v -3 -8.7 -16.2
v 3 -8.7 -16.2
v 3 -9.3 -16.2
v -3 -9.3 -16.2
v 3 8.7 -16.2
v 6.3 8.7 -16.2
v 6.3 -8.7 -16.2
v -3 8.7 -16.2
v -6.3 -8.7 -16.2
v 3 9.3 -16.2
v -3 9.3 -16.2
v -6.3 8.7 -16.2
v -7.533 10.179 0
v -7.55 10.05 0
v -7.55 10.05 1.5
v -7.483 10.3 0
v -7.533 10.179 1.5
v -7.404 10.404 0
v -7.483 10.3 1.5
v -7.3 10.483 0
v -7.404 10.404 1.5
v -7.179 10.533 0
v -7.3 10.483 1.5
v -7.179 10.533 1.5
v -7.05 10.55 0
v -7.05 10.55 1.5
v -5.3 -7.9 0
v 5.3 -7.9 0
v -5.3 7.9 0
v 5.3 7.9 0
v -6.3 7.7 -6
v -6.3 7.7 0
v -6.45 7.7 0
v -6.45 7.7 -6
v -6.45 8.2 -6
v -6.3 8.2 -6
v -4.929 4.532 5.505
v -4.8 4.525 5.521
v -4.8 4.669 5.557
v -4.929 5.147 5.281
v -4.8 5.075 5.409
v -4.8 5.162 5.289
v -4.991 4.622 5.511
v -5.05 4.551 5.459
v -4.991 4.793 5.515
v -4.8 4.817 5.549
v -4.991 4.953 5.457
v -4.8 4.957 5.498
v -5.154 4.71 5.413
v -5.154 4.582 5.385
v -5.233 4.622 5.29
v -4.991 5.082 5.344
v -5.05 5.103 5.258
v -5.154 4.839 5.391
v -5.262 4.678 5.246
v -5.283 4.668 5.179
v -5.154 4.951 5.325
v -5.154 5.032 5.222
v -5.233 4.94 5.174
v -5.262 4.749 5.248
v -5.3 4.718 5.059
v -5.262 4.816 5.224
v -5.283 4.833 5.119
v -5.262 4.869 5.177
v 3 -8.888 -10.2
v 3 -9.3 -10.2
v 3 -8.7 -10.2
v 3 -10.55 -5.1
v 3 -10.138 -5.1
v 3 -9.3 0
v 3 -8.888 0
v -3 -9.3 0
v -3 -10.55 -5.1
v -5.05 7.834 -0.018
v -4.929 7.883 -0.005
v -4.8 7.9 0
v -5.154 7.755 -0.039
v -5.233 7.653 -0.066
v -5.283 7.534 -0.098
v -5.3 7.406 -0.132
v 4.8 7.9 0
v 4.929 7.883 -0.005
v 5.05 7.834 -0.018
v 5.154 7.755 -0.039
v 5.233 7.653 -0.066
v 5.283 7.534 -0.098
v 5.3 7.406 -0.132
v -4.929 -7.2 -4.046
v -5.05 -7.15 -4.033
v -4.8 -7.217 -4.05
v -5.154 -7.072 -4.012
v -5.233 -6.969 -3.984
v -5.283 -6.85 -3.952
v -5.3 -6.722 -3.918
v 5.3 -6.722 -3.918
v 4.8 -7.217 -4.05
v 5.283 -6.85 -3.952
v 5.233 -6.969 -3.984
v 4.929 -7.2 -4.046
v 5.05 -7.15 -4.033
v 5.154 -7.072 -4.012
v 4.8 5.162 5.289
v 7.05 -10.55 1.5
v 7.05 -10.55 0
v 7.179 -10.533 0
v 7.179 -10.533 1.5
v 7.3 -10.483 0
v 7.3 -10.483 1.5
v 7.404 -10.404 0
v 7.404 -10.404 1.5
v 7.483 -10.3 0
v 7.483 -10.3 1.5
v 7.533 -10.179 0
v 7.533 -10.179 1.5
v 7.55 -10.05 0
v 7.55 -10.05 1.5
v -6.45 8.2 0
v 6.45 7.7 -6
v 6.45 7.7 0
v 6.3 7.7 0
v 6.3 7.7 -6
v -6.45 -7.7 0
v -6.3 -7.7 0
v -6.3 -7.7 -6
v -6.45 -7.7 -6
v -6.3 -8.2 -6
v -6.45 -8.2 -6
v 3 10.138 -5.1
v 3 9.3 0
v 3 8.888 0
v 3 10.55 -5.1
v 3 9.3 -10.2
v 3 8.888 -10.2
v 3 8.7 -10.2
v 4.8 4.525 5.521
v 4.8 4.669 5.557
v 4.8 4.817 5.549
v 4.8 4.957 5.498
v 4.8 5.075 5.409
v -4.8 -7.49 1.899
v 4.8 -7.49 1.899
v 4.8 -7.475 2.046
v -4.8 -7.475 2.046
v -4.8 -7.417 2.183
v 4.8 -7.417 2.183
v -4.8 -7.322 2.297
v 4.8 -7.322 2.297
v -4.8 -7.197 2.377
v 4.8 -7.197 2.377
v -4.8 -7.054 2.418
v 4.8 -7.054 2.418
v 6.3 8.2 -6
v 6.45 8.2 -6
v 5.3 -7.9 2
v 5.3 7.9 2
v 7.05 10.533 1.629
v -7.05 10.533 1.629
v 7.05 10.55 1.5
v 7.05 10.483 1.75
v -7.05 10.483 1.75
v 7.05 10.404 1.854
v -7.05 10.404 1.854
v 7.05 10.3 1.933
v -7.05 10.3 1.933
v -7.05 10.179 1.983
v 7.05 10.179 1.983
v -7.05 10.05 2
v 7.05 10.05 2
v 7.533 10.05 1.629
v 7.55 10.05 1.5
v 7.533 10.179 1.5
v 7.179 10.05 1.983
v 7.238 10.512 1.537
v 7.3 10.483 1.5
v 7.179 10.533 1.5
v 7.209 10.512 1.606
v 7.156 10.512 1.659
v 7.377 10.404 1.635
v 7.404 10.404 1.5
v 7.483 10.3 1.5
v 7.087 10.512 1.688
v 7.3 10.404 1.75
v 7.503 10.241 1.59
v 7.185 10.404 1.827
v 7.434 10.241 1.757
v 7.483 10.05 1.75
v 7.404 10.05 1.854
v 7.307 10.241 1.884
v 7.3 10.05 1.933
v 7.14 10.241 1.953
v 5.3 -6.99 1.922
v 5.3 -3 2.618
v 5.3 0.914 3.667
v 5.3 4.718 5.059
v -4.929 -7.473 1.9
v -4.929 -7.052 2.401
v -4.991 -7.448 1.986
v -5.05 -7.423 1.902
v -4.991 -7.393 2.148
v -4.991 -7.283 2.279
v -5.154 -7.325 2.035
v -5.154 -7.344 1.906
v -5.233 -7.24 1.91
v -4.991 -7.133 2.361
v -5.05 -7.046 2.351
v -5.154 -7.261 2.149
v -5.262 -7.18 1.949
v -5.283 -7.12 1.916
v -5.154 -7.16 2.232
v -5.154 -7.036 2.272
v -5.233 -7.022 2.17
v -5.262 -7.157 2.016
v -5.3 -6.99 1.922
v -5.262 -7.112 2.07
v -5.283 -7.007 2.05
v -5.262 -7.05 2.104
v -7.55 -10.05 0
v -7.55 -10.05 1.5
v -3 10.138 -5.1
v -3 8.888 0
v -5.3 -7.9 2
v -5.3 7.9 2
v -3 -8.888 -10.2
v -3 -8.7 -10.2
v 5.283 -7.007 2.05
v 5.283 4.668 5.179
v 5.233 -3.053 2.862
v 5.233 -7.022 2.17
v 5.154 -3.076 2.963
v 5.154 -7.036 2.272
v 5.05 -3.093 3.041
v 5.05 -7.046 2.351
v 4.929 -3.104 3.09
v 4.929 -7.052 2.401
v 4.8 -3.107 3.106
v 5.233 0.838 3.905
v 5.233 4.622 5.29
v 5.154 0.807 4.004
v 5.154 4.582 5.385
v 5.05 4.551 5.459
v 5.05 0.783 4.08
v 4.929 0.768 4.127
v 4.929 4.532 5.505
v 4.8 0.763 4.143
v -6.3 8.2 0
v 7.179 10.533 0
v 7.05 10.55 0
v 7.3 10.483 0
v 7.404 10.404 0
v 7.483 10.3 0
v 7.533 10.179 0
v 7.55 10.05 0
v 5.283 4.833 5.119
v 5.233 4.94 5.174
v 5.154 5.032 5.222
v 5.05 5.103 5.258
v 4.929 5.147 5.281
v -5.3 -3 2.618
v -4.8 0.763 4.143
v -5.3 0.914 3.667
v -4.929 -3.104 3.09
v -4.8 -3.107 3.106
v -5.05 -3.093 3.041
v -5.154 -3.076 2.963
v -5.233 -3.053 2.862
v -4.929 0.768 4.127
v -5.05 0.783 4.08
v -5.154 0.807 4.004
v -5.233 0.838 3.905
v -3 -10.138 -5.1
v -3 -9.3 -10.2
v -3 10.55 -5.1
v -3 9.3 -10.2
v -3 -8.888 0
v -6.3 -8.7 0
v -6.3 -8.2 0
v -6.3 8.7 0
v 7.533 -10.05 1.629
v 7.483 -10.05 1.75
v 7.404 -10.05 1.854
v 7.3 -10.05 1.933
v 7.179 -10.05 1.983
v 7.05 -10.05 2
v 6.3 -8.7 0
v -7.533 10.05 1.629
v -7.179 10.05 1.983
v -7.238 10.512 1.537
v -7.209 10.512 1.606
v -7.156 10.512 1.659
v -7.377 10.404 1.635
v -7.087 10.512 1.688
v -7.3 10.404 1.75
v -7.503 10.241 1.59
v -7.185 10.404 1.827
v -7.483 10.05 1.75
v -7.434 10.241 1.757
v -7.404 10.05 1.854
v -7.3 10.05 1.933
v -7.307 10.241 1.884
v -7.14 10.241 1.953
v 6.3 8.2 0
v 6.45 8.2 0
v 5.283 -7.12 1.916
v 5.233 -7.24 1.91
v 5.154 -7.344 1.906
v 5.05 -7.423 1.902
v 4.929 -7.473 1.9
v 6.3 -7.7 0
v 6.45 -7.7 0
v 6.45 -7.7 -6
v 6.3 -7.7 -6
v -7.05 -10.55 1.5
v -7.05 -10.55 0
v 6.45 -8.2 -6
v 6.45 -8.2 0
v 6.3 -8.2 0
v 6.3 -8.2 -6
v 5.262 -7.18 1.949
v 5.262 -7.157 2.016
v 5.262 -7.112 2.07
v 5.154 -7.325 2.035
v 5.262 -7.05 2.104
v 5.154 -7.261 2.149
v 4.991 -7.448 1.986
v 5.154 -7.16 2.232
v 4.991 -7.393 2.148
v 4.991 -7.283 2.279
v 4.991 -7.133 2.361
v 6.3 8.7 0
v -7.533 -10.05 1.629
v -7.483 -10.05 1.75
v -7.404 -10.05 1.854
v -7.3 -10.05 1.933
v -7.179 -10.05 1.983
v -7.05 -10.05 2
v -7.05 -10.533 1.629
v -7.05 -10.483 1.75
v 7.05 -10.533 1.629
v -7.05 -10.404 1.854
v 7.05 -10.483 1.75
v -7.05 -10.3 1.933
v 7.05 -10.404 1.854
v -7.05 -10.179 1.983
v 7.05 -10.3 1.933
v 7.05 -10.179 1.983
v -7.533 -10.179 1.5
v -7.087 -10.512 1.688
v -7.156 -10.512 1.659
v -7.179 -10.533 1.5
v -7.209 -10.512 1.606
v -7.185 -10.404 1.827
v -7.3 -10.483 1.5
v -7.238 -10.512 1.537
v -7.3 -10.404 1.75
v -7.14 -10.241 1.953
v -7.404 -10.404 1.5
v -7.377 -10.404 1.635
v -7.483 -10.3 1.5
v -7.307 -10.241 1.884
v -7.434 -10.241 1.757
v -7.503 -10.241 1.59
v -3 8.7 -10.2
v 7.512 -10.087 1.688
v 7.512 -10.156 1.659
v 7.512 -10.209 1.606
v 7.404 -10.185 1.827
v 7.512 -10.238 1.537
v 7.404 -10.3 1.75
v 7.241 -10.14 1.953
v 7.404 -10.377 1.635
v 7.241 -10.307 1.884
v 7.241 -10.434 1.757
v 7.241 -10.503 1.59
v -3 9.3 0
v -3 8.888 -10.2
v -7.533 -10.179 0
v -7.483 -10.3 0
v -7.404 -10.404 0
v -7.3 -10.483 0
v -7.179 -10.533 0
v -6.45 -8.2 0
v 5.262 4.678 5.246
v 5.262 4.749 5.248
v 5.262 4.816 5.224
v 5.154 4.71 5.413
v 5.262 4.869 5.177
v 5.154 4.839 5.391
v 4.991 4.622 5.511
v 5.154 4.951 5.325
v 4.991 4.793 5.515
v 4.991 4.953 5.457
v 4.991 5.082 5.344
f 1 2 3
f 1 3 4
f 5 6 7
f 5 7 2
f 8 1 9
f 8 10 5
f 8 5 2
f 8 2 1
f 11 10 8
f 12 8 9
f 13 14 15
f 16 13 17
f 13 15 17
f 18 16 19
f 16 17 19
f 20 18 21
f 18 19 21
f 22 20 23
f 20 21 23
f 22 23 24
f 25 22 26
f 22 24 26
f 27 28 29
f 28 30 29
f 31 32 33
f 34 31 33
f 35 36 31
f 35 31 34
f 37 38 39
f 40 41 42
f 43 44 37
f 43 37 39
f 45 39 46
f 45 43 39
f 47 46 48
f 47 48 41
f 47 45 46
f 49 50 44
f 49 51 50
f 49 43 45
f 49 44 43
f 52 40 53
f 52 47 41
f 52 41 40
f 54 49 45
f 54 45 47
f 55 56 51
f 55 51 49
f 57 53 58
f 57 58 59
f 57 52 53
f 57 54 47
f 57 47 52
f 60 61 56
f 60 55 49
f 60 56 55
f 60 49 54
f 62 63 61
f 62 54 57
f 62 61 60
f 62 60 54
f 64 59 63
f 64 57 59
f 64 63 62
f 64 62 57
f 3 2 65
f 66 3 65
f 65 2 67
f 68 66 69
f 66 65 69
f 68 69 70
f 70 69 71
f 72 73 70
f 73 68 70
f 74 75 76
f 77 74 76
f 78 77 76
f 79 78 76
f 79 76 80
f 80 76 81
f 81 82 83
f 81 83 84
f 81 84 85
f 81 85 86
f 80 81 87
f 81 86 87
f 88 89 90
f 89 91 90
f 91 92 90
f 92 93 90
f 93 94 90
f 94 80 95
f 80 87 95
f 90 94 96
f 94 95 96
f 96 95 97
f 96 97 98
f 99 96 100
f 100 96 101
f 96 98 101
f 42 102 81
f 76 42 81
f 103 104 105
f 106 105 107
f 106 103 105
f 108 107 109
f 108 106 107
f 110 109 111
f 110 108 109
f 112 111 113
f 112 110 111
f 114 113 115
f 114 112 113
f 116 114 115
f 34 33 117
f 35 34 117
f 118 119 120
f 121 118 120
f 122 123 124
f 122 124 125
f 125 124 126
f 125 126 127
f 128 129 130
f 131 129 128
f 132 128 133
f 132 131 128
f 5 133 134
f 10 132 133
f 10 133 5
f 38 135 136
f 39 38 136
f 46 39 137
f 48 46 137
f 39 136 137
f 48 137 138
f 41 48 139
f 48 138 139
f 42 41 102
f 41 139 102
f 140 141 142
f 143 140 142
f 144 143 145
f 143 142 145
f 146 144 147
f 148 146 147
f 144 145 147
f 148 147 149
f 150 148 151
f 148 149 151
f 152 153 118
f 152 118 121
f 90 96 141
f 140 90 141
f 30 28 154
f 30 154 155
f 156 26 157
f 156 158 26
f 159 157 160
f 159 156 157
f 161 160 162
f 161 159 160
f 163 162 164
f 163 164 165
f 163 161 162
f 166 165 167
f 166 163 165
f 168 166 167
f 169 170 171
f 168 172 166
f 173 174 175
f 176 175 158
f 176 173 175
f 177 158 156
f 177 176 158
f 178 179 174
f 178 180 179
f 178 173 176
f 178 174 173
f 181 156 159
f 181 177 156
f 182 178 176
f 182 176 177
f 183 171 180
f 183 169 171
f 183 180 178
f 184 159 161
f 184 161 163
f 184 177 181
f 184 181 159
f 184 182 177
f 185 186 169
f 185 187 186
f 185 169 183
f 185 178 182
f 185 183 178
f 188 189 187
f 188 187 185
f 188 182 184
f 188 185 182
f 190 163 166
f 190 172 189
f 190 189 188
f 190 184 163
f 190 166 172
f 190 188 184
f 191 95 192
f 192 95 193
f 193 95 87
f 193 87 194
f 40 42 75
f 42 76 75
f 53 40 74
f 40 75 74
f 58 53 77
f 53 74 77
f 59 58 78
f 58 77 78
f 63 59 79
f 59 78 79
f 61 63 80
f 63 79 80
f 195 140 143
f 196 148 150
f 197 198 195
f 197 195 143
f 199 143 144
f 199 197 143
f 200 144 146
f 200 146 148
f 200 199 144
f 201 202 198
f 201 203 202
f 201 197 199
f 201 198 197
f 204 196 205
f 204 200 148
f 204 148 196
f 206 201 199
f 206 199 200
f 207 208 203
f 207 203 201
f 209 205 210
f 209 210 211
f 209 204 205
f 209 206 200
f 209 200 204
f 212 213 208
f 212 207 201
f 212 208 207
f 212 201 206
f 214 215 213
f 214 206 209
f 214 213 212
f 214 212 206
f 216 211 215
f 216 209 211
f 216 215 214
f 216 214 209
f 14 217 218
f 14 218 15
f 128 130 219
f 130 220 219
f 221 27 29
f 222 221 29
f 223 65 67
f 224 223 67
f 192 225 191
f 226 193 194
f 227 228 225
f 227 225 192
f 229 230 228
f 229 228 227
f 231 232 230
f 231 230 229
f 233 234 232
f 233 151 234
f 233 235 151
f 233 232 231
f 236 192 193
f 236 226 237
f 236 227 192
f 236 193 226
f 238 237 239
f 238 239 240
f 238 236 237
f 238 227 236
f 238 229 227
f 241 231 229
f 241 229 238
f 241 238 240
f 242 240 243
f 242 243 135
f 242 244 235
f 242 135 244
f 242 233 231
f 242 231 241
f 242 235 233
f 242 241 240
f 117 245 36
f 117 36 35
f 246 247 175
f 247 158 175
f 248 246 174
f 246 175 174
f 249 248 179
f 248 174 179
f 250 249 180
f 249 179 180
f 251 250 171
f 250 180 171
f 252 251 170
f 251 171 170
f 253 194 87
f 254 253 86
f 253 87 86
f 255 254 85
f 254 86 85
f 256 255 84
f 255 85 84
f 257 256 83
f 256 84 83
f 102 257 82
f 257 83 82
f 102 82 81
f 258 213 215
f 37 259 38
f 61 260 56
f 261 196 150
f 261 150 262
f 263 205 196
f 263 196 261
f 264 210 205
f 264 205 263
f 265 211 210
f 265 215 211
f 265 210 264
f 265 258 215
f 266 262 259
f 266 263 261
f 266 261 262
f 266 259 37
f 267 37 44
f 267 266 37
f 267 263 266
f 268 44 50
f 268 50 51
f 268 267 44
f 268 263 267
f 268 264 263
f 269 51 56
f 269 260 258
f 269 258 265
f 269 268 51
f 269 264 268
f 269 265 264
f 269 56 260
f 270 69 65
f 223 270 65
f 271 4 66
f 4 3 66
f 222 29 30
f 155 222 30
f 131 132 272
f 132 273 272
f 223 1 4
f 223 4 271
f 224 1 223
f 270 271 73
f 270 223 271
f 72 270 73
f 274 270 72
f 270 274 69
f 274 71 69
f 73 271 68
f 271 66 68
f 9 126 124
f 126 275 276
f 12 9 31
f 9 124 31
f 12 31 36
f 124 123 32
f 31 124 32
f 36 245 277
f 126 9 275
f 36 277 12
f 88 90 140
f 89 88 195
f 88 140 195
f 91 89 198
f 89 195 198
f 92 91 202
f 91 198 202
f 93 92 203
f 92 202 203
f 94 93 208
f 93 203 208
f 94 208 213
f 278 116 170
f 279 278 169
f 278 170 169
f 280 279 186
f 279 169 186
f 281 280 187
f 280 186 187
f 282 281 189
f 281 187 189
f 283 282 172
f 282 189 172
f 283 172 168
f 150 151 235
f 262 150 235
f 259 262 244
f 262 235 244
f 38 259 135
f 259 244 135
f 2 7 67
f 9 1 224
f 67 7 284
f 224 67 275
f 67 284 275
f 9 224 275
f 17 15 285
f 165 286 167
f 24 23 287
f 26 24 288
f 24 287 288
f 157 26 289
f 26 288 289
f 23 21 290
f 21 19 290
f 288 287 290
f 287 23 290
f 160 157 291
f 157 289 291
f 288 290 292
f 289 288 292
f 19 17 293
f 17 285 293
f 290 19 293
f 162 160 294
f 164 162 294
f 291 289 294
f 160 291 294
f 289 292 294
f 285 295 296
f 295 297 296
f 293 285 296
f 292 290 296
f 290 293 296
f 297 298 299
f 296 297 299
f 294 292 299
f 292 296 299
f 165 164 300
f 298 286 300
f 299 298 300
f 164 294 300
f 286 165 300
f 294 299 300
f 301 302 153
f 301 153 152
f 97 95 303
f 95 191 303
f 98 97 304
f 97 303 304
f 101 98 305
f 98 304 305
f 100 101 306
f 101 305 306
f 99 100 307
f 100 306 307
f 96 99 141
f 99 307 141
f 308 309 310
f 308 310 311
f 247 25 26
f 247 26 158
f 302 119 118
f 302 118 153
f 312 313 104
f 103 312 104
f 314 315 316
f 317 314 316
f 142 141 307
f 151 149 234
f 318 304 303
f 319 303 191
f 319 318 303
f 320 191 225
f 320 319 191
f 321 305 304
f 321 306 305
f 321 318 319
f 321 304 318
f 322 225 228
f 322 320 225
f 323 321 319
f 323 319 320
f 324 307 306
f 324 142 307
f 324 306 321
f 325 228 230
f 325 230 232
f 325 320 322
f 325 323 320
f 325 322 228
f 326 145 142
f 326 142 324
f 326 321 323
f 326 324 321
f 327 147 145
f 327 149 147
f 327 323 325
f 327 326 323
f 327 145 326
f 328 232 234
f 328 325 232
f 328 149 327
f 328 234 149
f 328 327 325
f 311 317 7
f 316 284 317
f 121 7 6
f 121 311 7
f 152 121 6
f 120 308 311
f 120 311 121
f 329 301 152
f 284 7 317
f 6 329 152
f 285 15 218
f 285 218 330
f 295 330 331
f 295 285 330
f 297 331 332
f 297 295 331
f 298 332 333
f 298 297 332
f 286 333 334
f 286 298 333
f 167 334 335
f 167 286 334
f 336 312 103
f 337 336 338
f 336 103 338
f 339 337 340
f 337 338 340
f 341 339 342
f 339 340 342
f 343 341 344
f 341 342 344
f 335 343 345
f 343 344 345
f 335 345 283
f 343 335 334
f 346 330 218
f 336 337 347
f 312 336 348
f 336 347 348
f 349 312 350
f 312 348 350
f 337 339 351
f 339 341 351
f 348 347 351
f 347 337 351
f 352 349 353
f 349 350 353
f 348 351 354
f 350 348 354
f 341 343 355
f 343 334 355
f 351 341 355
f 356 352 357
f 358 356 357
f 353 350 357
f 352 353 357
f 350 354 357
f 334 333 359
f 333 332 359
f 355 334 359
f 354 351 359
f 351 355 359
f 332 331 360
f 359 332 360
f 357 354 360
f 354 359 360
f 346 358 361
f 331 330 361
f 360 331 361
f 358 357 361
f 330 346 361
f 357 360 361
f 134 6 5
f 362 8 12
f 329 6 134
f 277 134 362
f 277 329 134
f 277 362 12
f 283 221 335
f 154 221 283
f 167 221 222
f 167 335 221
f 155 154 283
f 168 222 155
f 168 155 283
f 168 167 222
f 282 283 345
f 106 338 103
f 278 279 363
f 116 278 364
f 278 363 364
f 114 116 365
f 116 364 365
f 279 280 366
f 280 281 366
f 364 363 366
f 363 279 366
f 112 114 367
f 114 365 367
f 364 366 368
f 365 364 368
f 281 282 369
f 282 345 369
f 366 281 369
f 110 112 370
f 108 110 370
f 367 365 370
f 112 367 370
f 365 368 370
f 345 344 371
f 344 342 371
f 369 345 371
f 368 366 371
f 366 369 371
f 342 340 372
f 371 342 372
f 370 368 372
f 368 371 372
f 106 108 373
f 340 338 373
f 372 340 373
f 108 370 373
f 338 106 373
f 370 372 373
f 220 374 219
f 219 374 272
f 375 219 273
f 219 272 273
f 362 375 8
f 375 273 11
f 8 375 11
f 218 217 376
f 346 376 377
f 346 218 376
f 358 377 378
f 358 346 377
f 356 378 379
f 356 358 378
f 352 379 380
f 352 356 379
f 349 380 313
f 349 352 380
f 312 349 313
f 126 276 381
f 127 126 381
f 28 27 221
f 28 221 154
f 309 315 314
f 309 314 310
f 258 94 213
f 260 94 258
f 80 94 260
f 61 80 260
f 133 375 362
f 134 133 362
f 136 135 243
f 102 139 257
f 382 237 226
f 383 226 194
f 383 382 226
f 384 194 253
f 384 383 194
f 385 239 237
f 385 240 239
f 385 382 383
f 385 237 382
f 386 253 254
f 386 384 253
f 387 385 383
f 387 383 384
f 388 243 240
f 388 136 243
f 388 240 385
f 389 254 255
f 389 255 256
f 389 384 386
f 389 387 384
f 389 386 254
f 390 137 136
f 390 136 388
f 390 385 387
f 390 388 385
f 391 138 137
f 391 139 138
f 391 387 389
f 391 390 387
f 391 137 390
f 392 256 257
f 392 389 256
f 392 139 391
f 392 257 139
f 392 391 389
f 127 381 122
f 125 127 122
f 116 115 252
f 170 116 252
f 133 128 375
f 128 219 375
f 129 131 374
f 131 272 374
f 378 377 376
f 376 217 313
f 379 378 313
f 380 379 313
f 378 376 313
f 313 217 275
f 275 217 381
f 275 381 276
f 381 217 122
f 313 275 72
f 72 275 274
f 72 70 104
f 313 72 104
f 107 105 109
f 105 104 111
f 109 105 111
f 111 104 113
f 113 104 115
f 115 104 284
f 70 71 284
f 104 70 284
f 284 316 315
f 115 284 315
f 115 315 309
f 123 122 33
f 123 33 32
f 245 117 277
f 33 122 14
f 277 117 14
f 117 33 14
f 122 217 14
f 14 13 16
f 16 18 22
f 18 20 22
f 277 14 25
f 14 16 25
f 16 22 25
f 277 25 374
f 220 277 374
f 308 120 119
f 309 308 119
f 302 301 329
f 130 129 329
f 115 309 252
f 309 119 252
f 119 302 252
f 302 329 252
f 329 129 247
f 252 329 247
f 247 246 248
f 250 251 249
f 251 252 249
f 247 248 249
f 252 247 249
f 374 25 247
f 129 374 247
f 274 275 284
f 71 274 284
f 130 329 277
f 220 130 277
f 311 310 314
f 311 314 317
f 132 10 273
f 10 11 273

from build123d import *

# Parameters (mm, degrees)
SKETCH1_W           = 15.1
SKETCH1_H           = 21.1
SKETCH1_W_2         = 10.6
SKETCH1_H_2         = 15.8
BOSS_EXTRUDE1_DEPTH = 2
FILLET2_R           = 0.5
SKETCH2_W           = 12.6
SKETCH2_H           = 17.4
BOSS_EXTRUDE2_DEPTH = 16.2
SKETCH3_W           = 0.15
SKETCH3_H           = 0.5
BOSS_EXTRUDE3_DEPTH = 6
BOSS_EXTRUDE4_DEPTH = 3
BOSS_EXTRUDE5_DEPTH = 5.3
FILLET3_R           = 0.5


with BuildPart() as part:
    # Sketch1 → Boss-Extrude1 (new body)
    with BuildSketch(Plane.XY):
        Rectangle(SKETCH1_W, SKETCH1_H)
        Rectangle(SKETCH1_W_2, SKETCH1_H_2, mode=Mode.SUBTRACT)
    extrude(amount=BOSS_EXTRUDE1_DEPTH)

    # Fillet2
    fillet2_edges = [part.edges().sort_by_distance(p)[0] for p in [
        (-7.55, 0, 2),
        (0, -10.55, 2),
        (7.55, 0, 2),
        (7.55, -10.55, 1),
        (-7.55, -10.55, 1),
        (-7.55, 10.55, 1),
        (7.55, 10.55, 1),
        (0, 10.55, 2),
    ]]
    fillet(fillet2_edges, radius=FILLET2_R)

    # Sketch2 → Boss-Extrude2 (add)
    with BuildSketch(Plane(origin=(0, 0, 0), x_dir=(-1, 0, 0), z_dir=(0, 0, -1))):
        Rectangle(SKETCH2_W, SKETCH2_H)
    extrude(amount=BOSS_EXTRUDE2_DEPTH)

    # Sketch3 → Boss-Extrude3 (add)
    with BuildSketch(Plane(origin=(0, 0, 0), x_dir=(-1, 0, 0), z_dir=(0, 0, -1))):
        with Locations((-6.375, 7.95)):
            Rectangle(SKETCH3_W, SKETCH3_H)
        with Locations((6.375, 7.95)):
            Rectangle(SKETCH3_W, SKETCH3_H)
        with Locations((6.375, -7.95)):
            Rectangle(SKETCH3_W, SKETCH3_H)
        with Locations((-6.375, -7.95)):
            Rectangle(SKETCH3_W, SKETCH3_H)
    extrude(amount=BOSS_EXTRUDE3_DEPTH)

    # Sketch4 → Boss-Extrude4 (add, symmetric)
    with BuildSketch(Plane(origin=(0, 0, 0), x_dir=(0, 0, -1), z_dir=(1, 0, 0))):
        Polygon((16.2, 8.7), (16.2, 9.3), (10.2, 9.3), (5.1, 10.55), (0, 9.3), (0, 8.888160604), (5.1, 10.138160604), (10.2, 8.888160604), (10.2, 8.7), align=None)
        Polygon((10.2, -8.7), (16.2, -8.7), (16.2, -9.3), (10.2, -9.3), (5.1, -10.55), (0, -9.3), (0, -8.888160604), (5.1, -10.138160604), (10.2, -8.888160604), align=None)
    extrude(amount=BOSS_EXTRUDE4_DEPTH, both=True)


with BuildPart() as body_2:
    # Sketch5 → Boss-Extrude5 (new, symmetric)
    with BuildSketch(Plane(origin=(0, 0, 0), x_dir=(0, 0, -1), z_dir=(1, 0, 0))):
        with BuildLine():
            Line((-5.288985027, 5.162030775), (0, 7.9))
            Line((0, 7.9), (4.050480947, -7.21660069))
            Line((4.050480947, -7.21660069), (-1.898899059, -7.489942299))
            ThreePointArc((-1.898899059, -7.489942299), (-2.243321676, -7.373423646), (-2.417744006, -7.054393261))
            ThreePointArc((-2.417744006, -7.054393261), (-3.581800812, -1.160702529), (-5.520543412, 4.525411769))
            ThreePointArc((-5.520543412, 4.525411769), (-5.529004436, 4.888911353), (-5.288985027, 5.162030775))
        make_face()
    extrude(amount=BOSS_EXTRUDE5_DEPTH, both=True)

    # Fillet3
    fillet3_edges = [body_2.edges().sort_by_distance(p)[0] for p in [
        (5.3, 4.888911353, 5.529004436),
        (5.3, -1.160702529, 3.581800812),
        (5.3, -7.373423646, 2.243321676),
        (5.3, -7.353271495, -1.075790944),
        (-5.3, -7.353271495, -1.075790944),
        (-5.3, -7.373423646, 2.243321676),
        (-5.3, -1.160702529, 3.581800812),
        (-5.3, 4.888911353, 5.529004436),
        (-5.3, 6.531015387, 2.644492513),
        (5.3, 6.531015387, 2.644492513),
    ]]
    fillet(fillet3_edges, radius=FILLET3_R)


solid = Compound([part.part, body_2.part])
